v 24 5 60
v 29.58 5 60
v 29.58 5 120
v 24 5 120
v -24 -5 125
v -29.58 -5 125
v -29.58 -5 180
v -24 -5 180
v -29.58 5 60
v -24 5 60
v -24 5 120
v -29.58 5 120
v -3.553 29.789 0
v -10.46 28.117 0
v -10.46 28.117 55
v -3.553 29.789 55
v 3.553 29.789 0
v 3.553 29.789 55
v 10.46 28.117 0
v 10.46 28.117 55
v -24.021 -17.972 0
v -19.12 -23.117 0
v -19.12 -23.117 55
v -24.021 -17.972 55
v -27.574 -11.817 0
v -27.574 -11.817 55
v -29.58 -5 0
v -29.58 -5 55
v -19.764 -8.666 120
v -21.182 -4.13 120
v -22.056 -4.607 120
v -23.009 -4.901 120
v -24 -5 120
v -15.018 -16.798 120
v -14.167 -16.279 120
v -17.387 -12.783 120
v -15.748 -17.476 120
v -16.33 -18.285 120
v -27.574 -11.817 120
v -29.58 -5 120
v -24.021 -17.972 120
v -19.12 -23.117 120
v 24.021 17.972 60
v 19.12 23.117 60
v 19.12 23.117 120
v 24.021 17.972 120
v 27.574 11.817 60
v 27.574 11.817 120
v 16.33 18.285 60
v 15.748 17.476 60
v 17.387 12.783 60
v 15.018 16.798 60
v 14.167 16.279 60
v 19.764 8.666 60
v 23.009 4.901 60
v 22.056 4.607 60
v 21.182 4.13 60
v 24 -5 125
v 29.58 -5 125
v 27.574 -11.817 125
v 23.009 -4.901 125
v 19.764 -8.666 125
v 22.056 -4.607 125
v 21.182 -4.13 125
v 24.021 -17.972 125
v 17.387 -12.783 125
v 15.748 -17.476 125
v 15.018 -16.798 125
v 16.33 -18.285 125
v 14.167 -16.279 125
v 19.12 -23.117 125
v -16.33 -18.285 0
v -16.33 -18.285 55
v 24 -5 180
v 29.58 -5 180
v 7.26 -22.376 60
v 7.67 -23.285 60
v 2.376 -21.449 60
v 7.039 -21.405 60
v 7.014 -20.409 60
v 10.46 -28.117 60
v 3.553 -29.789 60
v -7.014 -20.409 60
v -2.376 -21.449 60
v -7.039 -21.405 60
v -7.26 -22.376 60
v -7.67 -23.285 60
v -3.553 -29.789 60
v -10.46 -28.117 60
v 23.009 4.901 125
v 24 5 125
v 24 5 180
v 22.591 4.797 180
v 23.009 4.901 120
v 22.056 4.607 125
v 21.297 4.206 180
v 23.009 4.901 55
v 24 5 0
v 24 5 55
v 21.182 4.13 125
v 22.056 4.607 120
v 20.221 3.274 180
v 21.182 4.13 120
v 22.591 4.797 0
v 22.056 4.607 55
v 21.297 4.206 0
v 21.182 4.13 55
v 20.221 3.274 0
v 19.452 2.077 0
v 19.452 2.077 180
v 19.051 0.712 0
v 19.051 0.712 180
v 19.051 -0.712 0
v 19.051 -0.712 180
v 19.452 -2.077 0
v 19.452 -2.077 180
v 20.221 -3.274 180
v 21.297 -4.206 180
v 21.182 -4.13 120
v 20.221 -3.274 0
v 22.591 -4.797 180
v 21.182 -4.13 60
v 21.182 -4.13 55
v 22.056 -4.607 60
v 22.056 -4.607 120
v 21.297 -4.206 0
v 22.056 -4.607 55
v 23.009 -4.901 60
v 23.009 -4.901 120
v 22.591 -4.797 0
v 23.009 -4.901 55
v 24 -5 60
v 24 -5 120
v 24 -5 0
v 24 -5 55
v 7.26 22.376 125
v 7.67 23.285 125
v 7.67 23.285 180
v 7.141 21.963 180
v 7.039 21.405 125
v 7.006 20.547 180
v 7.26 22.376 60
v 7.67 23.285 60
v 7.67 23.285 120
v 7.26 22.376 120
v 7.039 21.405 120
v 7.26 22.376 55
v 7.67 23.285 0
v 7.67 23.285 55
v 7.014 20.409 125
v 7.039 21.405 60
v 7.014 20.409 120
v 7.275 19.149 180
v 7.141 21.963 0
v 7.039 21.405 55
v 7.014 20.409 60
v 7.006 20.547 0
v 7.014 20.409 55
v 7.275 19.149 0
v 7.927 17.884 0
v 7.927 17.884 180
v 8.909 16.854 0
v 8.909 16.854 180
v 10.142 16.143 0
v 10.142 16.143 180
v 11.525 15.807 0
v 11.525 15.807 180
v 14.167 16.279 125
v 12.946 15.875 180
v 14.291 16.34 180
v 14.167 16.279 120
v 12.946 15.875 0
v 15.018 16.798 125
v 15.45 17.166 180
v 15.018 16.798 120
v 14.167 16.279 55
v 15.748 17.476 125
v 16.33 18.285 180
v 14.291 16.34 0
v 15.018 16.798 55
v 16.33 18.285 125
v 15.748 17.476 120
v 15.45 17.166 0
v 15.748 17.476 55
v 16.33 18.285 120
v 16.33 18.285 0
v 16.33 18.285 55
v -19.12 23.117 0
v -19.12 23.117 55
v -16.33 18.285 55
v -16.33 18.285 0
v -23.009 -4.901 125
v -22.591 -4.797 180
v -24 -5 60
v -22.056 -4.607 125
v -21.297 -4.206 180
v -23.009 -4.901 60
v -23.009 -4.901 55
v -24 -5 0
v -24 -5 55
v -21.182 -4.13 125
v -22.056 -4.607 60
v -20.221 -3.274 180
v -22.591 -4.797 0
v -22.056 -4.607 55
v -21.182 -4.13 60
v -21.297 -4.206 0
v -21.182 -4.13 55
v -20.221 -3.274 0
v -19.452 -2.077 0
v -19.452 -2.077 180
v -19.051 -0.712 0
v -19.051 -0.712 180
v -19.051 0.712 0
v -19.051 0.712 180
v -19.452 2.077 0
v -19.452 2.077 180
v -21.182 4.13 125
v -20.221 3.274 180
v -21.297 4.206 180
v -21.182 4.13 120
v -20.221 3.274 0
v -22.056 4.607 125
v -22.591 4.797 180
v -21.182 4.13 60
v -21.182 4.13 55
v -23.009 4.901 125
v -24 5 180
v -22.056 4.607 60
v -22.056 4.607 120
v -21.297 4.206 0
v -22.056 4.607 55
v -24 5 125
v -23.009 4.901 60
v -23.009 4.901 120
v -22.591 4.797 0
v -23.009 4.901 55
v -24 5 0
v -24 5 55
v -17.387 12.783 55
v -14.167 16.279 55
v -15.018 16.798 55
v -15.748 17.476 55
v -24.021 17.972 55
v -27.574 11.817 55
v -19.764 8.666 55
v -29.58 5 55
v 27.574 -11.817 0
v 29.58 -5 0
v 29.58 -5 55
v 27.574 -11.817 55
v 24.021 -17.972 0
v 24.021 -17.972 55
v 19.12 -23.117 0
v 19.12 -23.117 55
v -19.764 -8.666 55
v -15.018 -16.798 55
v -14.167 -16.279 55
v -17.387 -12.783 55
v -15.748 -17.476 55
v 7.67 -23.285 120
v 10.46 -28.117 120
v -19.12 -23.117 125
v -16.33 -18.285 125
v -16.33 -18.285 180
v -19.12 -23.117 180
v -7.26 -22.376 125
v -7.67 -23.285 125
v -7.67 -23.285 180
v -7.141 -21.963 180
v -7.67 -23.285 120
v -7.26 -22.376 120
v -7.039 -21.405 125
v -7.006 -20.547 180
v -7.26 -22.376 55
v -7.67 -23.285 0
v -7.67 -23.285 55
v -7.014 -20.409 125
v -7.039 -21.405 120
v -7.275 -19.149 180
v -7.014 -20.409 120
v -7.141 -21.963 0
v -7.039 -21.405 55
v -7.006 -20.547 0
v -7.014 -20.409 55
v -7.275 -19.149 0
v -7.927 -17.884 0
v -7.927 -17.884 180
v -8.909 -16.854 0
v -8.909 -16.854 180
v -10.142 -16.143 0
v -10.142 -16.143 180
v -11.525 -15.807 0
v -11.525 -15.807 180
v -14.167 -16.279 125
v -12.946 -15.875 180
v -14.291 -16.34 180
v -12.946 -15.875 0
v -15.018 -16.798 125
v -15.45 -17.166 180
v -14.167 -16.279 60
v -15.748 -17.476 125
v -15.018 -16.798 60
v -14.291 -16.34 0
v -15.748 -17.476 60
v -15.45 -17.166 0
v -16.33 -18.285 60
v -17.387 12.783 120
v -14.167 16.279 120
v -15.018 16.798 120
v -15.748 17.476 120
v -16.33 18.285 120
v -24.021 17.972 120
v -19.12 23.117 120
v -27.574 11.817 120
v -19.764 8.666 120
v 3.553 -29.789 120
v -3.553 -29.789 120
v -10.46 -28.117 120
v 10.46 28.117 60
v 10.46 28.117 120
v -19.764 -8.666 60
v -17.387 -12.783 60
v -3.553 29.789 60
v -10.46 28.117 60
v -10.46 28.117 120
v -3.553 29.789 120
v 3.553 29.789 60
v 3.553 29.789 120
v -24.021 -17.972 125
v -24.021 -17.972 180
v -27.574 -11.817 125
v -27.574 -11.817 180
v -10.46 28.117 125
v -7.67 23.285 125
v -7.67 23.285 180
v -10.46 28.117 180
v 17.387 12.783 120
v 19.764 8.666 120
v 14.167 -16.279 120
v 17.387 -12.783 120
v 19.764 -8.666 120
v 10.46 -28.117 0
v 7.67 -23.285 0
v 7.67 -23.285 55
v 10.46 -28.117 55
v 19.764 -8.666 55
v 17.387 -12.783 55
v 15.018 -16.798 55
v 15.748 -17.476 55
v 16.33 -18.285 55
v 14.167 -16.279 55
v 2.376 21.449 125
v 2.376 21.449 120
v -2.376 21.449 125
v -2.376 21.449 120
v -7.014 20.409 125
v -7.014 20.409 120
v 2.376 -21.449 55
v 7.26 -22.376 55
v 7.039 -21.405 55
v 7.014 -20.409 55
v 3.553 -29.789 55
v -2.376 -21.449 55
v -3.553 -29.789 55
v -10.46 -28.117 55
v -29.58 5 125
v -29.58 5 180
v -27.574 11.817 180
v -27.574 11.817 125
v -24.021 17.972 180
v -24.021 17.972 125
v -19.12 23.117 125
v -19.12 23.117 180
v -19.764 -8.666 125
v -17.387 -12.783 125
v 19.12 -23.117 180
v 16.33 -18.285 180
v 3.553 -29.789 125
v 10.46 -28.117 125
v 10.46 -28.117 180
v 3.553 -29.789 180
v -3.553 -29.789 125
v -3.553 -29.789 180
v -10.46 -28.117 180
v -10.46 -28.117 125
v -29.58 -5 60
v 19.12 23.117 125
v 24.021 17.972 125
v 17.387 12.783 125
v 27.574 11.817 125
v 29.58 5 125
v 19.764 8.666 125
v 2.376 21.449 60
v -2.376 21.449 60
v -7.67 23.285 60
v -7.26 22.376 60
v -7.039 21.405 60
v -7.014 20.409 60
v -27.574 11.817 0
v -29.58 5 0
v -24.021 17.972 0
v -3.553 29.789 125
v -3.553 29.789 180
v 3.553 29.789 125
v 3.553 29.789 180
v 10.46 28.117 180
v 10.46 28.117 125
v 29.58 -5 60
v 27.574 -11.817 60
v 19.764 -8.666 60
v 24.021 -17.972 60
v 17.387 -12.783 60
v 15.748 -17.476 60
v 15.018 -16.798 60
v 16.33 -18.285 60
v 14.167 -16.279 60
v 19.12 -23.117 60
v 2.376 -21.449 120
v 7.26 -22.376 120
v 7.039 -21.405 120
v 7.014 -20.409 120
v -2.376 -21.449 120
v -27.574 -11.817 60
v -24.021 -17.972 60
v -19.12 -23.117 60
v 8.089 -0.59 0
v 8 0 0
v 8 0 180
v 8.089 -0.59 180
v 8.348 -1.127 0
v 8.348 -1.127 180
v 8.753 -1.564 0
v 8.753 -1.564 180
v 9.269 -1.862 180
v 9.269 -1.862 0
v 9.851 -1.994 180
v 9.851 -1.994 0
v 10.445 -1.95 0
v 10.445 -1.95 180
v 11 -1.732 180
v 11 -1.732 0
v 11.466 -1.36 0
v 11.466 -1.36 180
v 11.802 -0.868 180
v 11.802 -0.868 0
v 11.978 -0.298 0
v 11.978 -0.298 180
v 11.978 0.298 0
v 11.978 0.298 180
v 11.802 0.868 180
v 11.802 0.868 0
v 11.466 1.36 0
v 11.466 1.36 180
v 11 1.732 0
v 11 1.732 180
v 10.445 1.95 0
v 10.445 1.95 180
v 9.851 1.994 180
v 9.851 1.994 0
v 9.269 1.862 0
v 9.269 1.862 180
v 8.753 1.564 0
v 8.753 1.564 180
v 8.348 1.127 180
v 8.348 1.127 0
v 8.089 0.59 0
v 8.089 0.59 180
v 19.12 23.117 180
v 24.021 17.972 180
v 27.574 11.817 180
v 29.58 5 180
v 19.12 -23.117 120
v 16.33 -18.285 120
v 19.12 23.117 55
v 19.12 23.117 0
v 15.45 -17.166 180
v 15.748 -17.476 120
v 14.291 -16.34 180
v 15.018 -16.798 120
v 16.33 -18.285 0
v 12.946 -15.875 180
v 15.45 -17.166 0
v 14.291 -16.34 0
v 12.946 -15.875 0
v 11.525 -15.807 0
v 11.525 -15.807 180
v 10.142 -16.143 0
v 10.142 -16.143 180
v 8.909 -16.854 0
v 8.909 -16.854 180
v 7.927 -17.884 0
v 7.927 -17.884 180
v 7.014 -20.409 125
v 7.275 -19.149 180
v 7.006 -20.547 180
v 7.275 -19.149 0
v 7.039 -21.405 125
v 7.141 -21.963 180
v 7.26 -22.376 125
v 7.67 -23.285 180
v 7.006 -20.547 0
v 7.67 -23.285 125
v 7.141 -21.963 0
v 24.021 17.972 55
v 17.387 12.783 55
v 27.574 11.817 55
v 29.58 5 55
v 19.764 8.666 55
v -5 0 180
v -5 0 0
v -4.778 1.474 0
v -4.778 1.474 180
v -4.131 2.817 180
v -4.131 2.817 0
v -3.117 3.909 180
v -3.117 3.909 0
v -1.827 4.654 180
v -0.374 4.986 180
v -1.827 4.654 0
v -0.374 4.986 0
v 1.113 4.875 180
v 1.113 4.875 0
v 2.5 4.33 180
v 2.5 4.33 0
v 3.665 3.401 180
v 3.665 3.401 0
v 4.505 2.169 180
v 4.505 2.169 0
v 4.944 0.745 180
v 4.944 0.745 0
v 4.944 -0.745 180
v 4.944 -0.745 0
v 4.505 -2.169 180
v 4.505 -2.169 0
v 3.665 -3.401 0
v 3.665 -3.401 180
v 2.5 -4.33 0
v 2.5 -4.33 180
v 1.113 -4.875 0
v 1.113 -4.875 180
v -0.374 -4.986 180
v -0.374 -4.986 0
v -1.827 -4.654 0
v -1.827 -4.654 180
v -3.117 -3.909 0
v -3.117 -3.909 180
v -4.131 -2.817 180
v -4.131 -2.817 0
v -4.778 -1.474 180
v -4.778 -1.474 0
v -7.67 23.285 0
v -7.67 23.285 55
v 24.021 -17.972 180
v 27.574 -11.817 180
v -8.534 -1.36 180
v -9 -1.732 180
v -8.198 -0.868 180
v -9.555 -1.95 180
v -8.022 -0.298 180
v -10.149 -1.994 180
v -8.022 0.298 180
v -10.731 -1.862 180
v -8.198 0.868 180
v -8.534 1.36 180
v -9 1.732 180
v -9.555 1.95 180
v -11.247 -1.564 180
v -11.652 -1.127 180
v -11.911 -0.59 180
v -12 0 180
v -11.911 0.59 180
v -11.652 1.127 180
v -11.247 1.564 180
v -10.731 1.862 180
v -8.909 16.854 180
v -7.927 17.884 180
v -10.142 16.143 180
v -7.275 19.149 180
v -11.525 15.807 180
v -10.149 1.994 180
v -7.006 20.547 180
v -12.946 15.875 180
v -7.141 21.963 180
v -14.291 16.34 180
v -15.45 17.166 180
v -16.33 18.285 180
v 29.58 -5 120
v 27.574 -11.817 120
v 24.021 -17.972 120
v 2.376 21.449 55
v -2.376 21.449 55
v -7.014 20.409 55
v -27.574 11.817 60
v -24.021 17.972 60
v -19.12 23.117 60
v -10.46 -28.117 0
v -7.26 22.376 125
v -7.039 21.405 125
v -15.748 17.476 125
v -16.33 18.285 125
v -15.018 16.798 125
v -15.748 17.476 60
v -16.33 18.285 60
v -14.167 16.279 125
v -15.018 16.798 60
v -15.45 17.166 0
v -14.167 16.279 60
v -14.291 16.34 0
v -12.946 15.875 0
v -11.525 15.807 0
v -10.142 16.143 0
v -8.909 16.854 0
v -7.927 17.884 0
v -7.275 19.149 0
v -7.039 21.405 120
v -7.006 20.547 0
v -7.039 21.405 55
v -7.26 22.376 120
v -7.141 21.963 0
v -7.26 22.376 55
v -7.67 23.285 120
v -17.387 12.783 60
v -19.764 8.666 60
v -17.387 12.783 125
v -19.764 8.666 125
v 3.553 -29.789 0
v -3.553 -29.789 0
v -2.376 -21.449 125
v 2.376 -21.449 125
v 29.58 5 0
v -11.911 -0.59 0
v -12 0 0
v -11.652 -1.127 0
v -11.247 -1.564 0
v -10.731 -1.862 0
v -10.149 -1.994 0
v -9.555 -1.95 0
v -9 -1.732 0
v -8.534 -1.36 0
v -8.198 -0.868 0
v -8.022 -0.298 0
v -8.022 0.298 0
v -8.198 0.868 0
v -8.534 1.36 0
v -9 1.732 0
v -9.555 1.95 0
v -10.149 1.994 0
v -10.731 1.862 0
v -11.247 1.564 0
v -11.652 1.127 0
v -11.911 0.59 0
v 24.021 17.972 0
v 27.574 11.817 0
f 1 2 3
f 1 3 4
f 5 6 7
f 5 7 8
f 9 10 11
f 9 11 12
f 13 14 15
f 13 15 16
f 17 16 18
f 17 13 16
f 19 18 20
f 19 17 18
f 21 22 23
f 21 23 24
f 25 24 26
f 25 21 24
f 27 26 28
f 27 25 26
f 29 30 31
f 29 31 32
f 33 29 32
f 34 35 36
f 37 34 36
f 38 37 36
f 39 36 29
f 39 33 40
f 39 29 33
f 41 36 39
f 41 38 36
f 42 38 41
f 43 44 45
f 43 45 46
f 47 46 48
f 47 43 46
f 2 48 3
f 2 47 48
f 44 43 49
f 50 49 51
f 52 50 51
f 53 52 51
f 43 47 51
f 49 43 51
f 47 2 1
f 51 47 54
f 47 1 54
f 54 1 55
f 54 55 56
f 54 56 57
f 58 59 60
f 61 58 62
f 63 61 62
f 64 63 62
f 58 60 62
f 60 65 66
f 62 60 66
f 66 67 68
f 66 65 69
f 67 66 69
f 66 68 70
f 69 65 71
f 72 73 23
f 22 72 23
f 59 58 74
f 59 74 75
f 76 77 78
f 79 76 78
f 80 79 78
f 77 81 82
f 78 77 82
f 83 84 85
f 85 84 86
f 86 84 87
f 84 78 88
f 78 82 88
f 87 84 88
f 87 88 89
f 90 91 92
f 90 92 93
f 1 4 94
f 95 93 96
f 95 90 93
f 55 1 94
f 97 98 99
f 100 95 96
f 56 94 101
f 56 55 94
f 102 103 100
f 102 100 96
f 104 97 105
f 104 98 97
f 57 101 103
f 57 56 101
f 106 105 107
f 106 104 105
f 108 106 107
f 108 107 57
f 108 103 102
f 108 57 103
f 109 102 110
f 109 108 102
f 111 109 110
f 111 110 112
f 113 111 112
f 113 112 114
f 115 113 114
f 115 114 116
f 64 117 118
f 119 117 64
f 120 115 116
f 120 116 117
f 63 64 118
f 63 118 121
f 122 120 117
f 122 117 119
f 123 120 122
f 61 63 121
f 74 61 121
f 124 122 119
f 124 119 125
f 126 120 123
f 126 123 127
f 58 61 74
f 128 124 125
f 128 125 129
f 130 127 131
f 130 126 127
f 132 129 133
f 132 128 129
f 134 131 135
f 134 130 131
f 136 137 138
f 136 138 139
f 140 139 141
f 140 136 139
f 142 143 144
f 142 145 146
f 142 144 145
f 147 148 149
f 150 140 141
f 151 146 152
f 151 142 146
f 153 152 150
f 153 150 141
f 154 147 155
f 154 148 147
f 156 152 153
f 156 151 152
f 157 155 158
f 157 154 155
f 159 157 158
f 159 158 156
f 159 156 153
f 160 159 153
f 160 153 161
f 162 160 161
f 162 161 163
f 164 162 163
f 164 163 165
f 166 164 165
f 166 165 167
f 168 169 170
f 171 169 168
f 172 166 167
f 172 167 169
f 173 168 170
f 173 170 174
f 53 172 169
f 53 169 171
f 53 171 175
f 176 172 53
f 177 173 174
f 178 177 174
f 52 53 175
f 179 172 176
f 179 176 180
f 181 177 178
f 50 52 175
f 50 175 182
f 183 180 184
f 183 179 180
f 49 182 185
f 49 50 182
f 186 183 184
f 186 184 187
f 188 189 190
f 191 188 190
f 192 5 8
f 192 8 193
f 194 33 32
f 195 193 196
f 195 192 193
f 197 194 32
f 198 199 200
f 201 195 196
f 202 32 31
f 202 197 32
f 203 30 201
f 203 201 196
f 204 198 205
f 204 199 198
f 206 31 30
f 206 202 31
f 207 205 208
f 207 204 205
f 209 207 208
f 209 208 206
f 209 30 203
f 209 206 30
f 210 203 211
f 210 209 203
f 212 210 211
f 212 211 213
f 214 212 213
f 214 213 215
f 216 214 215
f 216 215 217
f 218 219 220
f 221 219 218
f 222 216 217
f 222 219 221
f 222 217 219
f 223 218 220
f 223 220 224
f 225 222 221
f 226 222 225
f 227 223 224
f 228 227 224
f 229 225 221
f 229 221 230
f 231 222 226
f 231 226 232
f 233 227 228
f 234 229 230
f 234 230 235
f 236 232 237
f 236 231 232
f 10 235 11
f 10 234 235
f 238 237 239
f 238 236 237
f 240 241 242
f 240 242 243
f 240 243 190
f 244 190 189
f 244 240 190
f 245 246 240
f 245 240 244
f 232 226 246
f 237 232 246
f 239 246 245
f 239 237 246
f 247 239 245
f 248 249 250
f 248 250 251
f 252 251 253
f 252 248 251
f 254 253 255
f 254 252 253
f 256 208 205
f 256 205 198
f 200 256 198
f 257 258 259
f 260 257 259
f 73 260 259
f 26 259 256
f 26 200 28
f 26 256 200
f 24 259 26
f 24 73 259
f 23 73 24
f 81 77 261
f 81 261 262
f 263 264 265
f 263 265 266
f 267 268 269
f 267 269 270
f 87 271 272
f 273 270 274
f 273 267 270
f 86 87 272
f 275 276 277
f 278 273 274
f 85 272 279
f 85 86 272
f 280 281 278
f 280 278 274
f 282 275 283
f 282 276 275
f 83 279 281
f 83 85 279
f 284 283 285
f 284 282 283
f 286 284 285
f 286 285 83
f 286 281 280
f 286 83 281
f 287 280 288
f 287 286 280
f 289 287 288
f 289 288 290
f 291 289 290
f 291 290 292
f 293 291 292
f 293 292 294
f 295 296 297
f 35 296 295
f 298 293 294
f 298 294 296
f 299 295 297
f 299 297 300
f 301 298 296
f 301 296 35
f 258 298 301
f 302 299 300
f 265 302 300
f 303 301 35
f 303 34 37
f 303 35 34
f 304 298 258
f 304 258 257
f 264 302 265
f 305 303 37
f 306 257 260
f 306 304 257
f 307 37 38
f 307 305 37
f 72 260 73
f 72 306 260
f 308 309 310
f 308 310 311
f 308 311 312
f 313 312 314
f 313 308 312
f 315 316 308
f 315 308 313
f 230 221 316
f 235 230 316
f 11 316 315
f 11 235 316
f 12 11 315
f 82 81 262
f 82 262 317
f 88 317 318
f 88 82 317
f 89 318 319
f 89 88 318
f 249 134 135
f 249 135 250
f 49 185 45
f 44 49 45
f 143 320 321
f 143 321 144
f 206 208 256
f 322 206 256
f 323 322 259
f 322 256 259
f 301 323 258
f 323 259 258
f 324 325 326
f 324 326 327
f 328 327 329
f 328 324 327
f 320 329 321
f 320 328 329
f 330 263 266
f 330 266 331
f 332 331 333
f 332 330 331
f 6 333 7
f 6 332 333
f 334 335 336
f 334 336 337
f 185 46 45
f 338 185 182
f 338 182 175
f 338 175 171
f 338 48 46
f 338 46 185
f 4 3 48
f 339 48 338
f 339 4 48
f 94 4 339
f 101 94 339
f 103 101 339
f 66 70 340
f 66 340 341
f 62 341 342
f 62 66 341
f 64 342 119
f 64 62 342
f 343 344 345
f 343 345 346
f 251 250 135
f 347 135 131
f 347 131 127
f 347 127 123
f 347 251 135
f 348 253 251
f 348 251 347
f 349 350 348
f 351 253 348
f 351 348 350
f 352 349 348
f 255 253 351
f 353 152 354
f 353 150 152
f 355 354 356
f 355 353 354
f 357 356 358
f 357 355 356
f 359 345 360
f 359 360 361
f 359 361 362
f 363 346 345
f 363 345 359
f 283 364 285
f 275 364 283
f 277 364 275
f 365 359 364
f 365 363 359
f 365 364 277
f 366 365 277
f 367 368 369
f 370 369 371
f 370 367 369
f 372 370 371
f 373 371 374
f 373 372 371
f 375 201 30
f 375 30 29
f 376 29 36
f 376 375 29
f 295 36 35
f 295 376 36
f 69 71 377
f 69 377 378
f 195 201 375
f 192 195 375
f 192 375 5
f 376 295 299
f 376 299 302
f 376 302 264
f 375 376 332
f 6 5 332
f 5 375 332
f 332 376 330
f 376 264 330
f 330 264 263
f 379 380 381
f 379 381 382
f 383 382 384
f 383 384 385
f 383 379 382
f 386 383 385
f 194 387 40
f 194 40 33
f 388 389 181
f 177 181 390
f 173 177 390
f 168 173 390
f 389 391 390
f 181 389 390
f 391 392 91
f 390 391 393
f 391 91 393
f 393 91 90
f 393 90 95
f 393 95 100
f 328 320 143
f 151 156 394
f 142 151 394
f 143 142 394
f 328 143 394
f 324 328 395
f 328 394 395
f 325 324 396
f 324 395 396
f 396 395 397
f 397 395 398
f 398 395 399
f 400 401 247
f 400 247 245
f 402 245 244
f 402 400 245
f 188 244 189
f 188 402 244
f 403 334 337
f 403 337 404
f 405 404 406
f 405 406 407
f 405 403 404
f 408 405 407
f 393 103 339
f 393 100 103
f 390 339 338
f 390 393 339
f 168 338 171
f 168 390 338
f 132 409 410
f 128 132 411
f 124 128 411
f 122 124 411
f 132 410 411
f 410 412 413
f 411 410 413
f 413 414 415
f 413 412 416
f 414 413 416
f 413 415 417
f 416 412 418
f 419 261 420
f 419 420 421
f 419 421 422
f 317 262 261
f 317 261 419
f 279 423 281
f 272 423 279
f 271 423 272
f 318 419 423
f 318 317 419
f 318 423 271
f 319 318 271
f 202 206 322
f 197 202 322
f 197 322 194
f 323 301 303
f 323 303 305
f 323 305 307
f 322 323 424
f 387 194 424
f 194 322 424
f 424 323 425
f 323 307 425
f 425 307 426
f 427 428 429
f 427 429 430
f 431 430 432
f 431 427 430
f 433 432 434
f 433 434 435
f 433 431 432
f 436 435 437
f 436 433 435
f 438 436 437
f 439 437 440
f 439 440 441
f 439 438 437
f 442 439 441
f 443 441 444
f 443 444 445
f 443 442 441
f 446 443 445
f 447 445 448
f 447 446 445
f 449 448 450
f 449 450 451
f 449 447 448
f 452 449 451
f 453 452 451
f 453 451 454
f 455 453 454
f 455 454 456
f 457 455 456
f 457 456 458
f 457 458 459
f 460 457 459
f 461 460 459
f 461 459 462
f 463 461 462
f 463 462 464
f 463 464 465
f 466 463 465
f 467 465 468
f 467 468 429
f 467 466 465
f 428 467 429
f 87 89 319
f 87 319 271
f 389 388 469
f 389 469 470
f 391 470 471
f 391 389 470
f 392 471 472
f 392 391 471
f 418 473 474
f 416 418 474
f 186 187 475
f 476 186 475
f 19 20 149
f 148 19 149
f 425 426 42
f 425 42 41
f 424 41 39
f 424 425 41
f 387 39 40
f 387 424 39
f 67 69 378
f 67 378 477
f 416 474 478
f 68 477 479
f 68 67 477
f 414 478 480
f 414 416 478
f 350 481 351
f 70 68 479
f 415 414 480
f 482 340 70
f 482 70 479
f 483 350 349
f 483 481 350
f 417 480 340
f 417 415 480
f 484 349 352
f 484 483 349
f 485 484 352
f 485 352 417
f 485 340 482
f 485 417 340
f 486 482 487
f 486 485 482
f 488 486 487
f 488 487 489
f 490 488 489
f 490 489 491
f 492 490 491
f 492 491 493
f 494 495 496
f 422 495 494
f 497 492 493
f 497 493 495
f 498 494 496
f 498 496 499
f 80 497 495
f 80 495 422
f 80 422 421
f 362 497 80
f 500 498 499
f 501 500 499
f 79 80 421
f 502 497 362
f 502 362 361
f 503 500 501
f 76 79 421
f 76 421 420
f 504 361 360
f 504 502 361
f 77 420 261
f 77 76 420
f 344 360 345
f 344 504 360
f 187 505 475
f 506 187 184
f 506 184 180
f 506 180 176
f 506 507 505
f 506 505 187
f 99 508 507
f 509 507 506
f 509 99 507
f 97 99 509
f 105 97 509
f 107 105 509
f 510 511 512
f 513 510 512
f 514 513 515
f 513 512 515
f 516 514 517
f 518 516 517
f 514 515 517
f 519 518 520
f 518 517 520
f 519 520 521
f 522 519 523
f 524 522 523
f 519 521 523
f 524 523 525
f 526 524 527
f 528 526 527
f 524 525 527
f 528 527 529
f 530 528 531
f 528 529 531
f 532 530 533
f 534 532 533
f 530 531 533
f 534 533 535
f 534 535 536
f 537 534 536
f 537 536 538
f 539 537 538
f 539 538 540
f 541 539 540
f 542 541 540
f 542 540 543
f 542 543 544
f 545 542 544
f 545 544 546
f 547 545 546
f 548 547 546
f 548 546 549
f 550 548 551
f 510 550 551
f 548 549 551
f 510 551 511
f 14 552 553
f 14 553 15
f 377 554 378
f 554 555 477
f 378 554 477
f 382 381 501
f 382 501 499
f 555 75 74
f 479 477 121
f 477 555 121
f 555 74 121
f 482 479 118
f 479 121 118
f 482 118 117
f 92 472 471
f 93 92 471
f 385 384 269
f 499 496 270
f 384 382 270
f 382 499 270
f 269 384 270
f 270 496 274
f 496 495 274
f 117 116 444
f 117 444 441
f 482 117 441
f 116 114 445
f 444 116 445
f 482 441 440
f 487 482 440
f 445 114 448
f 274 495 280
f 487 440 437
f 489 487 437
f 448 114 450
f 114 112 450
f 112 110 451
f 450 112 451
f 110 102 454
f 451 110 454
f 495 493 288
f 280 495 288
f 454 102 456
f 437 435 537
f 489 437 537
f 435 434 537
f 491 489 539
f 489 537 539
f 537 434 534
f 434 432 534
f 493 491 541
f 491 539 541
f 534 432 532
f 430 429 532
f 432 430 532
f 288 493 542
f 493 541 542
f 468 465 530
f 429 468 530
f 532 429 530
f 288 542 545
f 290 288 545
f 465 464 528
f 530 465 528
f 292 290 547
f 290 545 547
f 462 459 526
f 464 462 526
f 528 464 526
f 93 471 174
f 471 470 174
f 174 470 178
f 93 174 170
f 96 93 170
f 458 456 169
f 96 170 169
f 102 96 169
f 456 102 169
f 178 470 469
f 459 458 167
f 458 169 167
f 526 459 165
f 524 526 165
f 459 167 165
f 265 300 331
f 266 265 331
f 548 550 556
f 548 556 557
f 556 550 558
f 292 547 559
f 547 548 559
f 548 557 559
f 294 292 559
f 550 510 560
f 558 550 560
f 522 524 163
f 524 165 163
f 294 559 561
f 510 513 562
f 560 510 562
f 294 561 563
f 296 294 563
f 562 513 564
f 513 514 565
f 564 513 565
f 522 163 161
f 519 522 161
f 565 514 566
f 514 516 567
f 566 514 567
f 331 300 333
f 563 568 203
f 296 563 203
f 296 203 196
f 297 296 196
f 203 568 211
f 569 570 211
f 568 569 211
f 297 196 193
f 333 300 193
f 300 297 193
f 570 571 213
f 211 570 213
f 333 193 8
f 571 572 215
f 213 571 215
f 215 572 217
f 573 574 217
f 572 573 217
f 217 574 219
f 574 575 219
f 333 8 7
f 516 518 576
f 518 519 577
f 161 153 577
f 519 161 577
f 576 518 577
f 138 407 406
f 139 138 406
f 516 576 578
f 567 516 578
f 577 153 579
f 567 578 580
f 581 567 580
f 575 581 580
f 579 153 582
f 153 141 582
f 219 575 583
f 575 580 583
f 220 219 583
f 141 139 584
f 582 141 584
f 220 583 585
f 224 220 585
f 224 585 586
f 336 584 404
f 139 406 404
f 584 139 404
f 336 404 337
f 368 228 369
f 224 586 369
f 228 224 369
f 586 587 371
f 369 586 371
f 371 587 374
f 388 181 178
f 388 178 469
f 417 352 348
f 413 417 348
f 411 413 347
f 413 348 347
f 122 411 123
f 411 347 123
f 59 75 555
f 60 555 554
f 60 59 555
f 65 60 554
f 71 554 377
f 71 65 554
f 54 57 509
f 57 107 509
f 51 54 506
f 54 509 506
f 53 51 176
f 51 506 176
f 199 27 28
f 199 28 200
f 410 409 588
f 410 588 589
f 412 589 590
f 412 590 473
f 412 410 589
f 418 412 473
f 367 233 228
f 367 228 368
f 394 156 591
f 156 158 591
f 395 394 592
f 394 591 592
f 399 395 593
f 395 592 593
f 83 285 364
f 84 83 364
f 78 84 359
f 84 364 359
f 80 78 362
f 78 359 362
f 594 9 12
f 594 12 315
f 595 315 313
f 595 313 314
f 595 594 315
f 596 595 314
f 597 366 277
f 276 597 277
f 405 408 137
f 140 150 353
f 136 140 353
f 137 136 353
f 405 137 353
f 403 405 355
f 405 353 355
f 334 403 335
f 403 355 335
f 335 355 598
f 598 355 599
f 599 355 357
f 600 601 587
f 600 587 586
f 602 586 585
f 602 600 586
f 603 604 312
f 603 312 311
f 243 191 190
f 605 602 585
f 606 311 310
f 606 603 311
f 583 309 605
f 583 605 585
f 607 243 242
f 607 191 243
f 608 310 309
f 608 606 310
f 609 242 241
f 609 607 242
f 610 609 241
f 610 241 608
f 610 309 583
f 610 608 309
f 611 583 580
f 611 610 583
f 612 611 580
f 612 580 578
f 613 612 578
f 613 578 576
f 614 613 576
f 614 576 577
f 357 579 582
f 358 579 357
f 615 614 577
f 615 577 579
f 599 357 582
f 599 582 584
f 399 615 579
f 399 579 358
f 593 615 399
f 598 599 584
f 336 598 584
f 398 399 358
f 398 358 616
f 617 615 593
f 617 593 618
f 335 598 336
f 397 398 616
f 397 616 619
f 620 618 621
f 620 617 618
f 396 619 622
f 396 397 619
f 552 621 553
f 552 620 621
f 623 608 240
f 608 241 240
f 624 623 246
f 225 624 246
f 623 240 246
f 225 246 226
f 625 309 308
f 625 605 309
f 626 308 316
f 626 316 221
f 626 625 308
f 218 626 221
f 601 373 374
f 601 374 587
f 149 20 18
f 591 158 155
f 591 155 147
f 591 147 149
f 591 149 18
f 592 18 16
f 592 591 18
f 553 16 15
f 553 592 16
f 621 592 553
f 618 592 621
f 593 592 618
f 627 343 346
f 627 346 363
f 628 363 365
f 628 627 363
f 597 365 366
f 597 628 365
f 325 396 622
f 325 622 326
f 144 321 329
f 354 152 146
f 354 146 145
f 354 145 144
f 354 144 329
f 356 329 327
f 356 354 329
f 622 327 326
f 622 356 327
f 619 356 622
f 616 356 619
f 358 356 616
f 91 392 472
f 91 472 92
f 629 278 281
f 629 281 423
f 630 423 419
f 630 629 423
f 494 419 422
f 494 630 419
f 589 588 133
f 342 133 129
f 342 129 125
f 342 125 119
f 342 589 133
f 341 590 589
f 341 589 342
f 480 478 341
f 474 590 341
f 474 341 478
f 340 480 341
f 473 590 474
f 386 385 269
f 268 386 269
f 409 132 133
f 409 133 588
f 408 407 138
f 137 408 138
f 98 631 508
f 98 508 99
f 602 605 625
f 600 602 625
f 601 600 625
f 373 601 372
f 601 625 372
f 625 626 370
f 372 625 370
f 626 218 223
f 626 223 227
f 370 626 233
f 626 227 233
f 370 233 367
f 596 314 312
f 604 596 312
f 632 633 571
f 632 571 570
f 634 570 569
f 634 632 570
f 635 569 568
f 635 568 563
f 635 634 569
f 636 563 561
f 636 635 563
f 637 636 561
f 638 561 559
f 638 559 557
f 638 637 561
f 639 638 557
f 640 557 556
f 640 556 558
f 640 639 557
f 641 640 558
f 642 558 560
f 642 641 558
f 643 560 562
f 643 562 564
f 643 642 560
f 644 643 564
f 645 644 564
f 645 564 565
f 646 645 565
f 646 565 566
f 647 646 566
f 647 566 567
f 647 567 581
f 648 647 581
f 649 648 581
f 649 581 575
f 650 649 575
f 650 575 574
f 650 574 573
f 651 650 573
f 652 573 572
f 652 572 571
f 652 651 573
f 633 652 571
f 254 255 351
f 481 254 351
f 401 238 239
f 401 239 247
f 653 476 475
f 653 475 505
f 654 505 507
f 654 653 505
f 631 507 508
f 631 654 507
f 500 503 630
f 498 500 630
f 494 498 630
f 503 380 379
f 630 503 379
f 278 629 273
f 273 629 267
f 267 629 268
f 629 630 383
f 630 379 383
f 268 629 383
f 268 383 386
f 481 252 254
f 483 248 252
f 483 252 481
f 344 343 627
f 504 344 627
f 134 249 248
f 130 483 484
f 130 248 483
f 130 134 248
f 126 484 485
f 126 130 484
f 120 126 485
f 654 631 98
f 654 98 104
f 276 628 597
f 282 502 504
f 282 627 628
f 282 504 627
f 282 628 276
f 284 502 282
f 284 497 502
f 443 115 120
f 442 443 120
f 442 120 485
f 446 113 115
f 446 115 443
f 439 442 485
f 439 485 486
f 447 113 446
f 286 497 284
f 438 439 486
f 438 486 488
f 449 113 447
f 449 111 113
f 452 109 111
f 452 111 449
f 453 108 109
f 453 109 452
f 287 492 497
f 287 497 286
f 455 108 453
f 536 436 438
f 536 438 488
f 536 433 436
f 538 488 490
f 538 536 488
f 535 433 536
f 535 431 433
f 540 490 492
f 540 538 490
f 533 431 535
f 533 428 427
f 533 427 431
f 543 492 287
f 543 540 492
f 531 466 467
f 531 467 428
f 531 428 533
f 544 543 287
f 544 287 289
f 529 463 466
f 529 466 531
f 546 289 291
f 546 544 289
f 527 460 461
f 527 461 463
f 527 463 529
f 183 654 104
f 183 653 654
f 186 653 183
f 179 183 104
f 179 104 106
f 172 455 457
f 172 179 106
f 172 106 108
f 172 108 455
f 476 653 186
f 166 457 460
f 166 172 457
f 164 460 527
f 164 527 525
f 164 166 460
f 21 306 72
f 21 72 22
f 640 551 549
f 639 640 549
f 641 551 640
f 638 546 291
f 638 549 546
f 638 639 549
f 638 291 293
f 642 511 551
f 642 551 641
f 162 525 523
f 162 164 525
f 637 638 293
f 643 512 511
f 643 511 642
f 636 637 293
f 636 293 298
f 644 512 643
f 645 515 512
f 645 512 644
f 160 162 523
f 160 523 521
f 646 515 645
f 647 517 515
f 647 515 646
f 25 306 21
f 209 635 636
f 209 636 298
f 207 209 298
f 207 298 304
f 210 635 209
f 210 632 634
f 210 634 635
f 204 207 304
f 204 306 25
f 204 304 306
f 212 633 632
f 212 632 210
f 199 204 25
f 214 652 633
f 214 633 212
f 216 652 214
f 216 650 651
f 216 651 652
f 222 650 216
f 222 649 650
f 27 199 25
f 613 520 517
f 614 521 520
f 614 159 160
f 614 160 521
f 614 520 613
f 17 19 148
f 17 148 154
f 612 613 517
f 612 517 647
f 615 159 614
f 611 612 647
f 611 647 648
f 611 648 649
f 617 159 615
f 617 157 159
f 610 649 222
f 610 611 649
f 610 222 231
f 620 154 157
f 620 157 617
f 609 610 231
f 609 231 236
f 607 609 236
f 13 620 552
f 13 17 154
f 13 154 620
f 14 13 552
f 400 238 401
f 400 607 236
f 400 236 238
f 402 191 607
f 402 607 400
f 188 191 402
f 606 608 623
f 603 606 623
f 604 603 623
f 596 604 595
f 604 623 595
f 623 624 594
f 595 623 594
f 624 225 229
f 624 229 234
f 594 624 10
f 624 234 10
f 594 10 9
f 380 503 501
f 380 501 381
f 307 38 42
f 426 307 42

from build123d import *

# Parameters (mm, degrees)
SKETCH_1_R          = 2
EXTRUDE_1_DEPTH     = 180
SKETCH_2_R          = 5
CUT_EXTRUDE_1_DEPTH = 180
SKETCH_3_W          = 11.661291253
SKETCH_3_H          = 5


with BuildPart() as part:
    # 草图1 → 凸台-拉伸1 (new body)
    with BuildSketch(Plane.XY):
        with BuildLine():
            Line((-24, 5), (-29.580398915, 5))
            ThreePointArc((-29.580398915, 5), (-25.980762114, 15), (-19.120326477, 23.117376915))
            Line((-19.120326477, 23.117376915), (-16.330127019, 18.284609691))
            ThreePointArc((-16.330127019, 18.284609691), (-9.5, 16.454482672), (-7.669872981, 23.284609691))
            Line((-7.669872981, 23.284609691), (-10.460072439, 28.117376915))
            ThreePointArc((-10.460072439, 28.117376915), (0, 30), (10.460072439, 28.117376915))
            Line((10.460072439, 28.117376915), (7.669872981, 23.284609691))
            ThreePointArc((7.669872981, 23.284609691), (9.5, 16.454482672), (16.330127019, 18.284609691))
            Line((16.330127019, 18.284609691), (19.120326477, 23.117376915))
            ThreePointArc((19.120326477, 23.117376915), (25.980762114, 15), (29.580398915, 5))
            Line((29.580398915, 5), (24, 5))
            ThreePointArc((24, 5), (19, 0), (24, -5))
            Line((24, -5), (29.580398915, -5))
            ThreePointArc((29.580398915, -5), (25.980762114, -15), (19.120326477, -23.117376915))
            Line((19.120326477, -23.117376915), (16.330127019, -18.284609691))
            ThreePointArc((16.330127019, -18.284609691), (9.5, -16.454482672), (7.669872981, -23.284609691))
            Line((7.669872981, -23.284609691), (10.460072439, -28.117376915))
            ThreePointArc((10.460072439, -28.117376915), (0, -30), (-10.460072439, -28.117376915))
            Line((-10.460072439, -28.117376915), (-7.669872981, -23.284609691))
            ThreePointArc((-7.669872981, -23.284609691), (-9.5, -16.454482672), (-16.330127019, -18.284609691))
            Line((-16.330127019, -18.284609691), (-19.120326477, -23.117376915))
            ThreePointArc((-19.120326477, -23.117376915), (-25.980762114, -15), (-29.580398915, -5))
            Line((-29.580398915, -5), (-24, -5))
            ThreePointArc((-24, -5), (-19, 0), (-24, 5))
        make_face()
        with Locations((-10, 0)):
            Circle(SKETCH_1_R, mode=Mode.SUBTRACT)
        with Locations((10, 0)):
            Circle(SKETCH_1_R, mode=Mode.SUBTRACT)
    extrude(amount=EXTRUDE_1_DEPTH)

    # 草图2 → 切除-拉伸1 (cut)
    with BuildSketch(Plane(origin=(0, 0, 0), x_dir=(-1, 0, 0), z_dir=(0, 0, -1))):
        Circle(SKETCH_2_R)
    extrude(amount=-CUT_EXTRUDE_1_DEPTH, mode=Mode.SUBTRACT)

    # 草图3 → 切除-旋转1 (revolve, cut)
    with BuildSketch(Plane(origin=(0, 0, 0), x_dir=(1, 0, 0), z_dir=(0, 1, 0))):
        with Locations((-27.411044542, -57.5)):
            Rectangle(SKETCH_3_W, SKETCH_3_H)
    cut_revolve_1 = revolve(axis=Axis((0, 0, -56.149742432), (0, 0, 1)), mode=Mode.SUBTRACT)

    # 镜向1: 切除-旋转1 across plane
    add(cut_revolve_1.mirror(Plane.XY.offset(90)), mode=Mode.SUBTRACT)


solid = part.part
